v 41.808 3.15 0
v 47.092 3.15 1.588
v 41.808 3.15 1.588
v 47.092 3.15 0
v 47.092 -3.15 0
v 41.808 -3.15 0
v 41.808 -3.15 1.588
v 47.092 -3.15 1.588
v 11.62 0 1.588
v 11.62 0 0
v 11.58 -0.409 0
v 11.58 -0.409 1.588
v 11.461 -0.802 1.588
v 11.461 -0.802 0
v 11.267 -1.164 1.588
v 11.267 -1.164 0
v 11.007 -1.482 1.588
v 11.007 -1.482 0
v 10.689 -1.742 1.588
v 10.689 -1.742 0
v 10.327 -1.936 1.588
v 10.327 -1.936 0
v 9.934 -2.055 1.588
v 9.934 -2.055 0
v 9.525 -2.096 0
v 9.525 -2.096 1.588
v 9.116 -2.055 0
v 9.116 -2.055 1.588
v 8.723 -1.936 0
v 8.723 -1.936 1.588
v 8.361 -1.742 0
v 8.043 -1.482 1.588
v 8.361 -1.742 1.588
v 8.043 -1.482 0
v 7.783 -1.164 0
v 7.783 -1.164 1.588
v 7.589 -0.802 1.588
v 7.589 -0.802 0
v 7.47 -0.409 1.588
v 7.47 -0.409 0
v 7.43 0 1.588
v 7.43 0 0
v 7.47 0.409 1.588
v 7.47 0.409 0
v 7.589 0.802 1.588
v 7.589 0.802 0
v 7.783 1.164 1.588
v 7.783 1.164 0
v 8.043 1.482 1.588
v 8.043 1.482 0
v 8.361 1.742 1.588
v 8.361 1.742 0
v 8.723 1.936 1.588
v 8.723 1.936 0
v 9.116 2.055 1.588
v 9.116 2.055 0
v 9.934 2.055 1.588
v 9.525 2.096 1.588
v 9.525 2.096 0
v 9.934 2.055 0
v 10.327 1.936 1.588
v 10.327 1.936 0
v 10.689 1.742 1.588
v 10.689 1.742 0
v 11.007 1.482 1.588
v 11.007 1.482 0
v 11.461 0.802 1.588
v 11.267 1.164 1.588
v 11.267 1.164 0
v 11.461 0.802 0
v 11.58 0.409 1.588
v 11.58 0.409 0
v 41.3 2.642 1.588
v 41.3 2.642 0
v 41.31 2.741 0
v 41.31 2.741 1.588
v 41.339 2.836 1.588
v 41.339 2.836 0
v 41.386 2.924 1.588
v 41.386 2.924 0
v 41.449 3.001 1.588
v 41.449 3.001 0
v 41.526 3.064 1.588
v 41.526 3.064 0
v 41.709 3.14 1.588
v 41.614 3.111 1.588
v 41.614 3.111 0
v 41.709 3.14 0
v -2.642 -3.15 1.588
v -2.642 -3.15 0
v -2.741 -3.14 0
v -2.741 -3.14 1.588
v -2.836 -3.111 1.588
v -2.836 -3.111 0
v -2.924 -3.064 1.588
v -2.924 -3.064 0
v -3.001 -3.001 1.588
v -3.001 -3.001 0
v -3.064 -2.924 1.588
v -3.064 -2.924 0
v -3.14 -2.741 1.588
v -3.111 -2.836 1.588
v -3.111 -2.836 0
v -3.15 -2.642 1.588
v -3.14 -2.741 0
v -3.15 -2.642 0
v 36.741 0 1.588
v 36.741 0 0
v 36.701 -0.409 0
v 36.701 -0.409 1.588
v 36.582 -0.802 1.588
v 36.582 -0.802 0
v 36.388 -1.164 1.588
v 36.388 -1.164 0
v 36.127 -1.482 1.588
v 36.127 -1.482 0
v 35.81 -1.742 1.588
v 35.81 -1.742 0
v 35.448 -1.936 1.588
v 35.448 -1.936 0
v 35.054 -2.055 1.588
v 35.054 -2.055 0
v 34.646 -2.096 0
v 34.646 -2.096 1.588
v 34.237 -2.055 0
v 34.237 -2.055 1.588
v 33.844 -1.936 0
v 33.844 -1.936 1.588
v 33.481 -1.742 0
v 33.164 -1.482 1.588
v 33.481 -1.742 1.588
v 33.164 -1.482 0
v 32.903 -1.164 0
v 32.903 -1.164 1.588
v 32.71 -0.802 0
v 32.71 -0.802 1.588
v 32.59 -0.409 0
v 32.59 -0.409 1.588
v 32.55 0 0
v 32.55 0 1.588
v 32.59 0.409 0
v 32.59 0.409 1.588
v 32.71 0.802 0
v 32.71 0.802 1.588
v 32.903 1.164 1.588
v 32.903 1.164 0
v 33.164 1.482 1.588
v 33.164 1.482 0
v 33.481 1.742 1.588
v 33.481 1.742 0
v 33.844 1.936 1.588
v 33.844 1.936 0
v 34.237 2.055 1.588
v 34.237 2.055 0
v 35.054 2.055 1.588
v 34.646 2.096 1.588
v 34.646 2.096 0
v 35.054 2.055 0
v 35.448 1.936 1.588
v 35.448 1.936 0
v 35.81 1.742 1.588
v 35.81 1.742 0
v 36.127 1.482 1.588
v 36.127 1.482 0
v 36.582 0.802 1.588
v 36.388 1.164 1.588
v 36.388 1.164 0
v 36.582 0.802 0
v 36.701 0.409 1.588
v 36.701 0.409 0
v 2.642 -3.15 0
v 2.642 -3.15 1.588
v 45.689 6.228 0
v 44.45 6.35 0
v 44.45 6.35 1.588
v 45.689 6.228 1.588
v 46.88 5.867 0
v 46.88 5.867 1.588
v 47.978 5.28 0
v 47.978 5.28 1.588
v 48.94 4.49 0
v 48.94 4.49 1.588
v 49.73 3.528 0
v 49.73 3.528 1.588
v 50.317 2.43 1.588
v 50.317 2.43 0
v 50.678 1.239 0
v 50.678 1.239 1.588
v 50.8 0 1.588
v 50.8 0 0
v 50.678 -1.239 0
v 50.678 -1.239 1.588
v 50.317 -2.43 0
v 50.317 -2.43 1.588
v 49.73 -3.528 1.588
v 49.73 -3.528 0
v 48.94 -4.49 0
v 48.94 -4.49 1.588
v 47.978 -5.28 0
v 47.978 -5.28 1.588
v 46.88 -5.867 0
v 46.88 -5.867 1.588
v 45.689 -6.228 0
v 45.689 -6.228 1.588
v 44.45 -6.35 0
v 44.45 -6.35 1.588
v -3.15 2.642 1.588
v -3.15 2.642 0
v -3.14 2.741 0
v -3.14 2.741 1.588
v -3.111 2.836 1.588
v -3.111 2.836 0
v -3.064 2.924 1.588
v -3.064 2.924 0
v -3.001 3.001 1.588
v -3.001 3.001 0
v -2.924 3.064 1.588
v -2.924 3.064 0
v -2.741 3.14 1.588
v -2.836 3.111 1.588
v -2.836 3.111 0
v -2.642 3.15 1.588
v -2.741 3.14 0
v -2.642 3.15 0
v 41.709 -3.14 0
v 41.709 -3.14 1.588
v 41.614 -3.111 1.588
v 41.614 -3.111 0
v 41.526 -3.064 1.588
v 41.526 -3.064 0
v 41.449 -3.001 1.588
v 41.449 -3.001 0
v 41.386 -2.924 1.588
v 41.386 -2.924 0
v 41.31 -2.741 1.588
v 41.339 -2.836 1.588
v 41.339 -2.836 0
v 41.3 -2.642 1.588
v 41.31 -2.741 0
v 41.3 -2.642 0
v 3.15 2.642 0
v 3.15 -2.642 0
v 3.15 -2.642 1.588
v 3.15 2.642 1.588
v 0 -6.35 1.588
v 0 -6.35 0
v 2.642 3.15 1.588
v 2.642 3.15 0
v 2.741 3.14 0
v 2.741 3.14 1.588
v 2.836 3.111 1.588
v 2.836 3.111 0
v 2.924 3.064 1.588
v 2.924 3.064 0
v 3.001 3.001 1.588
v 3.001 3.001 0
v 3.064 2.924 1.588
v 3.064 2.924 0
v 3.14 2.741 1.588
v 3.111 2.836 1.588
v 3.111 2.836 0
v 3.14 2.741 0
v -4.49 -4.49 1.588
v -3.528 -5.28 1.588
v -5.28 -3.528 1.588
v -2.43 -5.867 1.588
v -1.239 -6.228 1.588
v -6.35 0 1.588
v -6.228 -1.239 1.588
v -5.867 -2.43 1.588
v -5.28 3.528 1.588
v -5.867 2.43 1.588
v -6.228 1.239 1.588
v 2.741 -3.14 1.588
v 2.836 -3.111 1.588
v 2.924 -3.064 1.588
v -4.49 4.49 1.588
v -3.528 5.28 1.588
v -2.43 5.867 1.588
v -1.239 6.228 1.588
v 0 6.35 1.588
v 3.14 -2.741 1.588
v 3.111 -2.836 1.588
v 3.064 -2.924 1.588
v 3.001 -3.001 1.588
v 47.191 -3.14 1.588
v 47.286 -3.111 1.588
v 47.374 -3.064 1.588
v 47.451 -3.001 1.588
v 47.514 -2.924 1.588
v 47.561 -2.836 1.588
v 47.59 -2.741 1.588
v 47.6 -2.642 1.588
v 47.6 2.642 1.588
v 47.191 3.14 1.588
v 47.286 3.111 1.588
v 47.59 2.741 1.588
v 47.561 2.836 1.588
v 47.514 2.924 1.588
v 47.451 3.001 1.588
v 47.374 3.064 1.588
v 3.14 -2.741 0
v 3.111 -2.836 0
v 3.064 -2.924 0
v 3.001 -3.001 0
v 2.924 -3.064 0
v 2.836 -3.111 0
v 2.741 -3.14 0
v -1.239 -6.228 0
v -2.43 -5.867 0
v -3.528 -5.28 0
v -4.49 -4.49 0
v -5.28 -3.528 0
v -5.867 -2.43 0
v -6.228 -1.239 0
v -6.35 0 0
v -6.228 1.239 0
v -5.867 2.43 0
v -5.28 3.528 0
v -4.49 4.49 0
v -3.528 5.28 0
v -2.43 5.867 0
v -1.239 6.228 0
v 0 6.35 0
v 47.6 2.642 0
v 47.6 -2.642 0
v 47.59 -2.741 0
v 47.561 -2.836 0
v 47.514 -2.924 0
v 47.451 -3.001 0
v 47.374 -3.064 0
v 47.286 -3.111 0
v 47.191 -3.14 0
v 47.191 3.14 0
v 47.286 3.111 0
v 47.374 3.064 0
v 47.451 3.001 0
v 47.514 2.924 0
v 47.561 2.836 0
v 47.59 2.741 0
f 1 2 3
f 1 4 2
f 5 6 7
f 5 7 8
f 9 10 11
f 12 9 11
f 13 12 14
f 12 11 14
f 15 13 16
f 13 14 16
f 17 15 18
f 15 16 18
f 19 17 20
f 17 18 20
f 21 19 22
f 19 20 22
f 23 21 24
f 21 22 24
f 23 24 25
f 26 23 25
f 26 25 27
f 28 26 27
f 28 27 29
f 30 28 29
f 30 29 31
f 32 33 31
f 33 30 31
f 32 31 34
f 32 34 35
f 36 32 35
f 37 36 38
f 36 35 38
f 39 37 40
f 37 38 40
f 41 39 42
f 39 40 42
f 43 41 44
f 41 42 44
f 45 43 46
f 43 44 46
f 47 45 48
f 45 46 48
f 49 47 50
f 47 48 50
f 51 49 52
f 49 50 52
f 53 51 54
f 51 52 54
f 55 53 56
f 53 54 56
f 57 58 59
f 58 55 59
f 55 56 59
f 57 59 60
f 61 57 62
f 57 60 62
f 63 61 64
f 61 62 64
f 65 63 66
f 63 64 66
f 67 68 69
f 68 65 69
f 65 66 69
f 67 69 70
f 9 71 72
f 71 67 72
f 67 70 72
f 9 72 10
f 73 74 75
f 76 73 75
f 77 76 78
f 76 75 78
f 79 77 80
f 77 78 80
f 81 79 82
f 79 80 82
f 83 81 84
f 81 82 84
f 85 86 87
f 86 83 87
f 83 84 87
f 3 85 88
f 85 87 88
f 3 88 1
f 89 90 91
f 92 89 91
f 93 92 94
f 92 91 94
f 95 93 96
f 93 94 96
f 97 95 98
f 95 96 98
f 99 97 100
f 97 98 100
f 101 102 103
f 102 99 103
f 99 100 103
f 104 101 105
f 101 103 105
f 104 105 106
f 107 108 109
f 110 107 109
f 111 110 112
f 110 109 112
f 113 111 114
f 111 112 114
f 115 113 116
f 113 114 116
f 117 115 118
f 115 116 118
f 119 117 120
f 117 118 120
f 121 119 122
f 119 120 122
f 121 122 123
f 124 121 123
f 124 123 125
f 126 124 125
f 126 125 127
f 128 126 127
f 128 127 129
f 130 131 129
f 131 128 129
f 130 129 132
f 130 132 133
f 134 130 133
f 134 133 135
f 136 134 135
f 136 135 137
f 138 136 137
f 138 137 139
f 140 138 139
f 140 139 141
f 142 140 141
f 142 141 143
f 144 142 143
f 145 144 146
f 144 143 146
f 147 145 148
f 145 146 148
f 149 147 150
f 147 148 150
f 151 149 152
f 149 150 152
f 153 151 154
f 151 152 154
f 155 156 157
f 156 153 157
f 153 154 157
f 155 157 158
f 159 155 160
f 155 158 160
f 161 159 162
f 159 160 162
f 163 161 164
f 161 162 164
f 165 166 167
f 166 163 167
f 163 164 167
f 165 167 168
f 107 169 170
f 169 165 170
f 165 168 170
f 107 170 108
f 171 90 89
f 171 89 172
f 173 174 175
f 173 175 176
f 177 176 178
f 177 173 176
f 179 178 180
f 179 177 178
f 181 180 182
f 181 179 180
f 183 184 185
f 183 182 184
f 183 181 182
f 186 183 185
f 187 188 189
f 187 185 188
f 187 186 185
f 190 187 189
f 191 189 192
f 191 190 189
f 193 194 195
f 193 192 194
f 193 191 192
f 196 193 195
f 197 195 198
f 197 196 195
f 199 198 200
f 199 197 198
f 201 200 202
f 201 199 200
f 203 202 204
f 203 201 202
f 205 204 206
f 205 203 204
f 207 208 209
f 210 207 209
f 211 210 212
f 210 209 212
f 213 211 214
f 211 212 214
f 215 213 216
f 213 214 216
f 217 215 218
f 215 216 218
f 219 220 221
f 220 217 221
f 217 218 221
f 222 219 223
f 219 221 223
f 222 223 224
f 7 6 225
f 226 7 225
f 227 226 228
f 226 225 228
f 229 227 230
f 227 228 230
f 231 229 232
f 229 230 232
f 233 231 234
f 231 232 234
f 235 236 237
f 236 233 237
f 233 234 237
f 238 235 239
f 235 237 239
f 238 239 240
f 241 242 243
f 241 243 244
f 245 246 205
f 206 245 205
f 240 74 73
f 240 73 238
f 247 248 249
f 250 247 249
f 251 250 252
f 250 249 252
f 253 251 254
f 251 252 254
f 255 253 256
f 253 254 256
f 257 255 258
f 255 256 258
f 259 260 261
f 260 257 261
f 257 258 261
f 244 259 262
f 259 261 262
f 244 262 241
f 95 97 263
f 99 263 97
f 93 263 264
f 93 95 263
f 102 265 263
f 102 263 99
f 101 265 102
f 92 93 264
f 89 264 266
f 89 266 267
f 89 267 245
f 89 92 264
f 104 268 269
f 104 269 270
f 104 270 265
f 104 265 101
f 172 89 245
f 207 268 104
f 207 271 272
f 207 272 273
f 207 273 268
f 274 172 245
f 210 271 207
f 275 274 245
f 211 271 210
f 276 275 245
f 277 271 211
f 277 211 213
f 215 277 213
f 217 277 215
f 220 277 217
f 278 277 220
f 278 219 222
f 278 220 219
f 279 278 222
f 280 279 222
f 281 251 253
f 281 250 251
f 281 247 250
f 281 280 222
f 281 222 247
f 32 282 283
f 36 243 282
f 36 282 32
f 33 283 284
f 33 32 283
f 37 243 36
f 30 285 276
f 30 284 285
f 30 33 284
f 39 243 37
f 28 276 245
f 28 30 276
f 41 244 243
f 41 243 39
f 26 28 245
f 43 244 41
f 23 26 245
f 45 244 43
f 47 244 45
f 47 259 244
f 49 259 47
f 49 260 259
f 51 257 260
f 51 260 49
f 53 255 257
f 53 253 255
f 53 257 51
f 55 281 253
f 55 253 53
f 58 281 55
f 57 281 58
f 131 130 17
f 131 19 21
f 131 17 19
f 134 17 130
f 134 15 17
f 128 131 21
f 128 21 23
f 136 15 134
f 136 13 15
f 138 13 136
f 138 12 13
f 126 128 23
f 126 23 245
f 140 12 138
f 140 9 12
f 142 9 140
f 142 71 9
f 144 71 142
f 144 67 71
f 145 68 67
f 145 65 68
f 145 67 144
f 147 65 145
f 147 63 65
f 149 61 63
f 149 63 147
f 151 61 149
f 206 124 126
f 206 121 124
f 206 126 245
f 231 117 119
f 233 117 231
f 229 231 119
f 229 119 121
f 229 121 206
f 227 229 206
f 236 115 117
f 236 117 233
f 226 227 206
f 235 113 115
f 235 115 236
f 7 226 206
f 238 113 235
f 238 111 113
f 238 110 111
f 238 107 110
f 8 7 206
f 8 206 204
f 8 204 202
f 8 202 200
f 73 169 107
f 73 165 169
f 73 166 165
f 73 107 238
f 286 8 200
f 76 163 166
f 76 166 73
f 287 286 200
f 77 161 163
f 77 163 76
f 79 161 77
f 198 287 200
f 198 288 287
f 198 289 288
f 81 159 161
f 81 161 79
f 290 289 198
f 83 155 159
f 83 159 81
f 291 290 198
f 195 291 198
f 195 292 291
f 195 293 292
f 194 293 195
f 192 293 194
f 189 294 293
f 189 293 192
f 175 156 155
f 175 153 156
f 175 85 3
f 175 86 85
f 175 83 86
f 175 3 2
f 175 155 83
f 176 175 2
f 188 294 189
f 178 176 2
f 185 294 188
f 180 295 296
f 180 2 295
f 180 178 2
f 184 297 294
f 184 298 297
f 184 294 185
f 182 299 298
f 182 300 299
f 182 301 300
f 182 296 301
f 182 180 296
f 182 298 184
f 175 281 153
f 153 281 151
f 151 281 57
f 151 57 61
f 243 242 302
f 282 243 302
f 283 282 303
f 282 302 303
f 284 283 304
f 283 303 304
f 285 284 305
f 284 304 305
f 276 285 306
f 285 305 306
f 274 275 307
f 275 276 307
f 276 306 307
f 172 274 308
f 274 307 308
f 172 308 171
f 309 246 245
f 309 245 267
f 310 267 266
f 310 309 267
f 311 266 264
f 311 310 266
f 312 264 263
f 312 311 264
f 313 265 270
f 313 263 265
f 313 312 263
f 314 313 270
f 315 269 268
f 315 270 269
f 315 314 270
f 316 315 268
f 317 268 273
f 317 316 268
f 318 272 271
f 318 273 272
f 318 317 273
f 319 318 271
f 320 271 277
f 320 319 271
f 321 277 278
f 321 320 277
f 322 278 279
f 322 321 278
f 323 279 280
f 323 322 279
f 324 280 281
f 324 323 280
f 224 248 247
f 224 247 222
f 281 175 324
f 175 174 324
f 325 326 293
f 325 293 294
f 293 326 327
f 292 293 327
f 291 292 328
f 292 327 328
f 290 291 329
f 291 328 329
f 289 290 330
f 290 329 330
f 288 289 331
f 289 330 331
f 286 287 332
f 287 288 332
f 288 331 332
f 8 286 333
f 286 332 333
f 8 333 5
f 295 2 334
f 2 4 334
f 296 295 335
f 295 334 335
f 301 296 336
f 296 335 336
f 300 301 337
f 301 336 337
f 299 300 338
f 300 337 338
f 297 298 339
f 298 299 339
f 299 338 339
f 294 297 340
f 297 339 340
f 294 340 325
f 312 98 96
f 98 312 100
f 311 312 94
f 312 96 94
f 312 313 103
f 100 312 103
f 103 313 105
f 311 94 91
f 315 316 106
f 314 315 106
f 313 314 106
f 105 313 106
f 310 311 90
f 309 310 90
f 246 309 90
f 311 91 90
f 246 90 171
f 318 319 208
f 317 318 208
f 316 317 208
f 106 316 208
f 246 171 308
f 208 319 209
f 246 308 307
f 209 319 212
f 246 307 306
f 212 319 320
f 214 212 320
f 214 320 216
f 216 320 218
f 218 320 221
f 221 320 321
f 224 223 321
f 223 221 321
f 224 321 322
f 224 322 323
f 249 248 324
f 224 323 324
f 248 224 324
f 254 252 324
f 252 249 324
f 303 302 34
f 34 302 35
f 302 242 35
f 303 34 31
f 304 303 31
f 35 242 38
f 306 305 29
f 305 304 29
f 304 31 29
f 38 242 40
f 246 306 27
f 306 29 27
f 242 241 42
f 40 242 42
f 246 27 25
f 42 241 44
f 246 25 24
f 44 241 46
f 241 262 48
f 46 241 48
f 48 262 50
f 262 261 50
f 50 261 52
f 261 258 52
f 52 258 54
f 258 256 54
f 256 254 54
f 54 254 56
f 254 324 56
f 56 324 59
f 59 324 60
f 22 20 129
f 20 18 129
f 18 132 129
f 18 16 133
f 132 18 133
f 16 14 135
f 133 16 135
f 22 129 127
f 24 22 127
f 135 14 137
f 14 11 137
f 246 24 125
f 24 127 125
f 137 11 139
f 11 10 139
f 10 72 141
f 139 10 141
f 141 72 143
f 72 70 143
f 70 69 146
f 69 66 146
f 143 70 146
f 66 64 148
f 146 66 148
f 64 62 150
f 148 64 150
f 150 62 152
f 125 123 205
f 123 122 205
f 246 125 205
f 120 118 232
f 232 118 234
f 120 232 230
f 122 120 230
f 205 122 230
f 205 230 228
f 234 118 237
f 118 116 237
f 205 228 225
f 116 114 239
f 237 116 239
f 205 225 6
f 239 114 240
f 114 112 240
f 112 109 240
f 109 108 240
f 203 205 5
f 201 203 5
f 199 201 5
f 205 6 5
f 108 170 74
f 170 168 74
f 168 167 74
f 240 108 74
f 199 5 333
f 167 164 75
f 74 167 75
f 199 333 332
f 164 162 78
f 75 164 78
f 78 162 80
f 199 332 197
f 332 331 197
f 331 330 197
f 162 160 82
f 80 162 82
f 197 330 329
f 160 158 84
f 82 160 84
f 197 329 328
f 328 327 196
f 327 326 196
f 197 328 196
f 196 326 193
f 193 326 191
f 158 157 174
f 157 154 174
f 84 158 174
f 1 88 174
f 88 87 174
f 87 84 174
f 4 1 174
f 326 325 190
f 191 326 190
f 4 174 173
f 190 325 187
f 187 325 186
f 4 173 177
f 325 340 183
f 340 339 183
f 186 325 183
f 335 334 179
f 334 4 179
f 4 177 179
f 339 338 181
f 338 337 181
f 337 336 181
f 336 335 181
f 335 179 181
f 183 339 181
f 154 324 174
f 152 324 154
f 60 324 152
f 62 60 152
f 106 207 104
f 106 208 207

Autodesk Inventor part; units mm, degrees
ref_plane "YZ Plane" through (0, 0, 0) normal (1, 0, 0) x (0, 1, 0)
ref_plane "XZ Plane" through (0, 0, 0) normal (0, 1, 0) x (-1, 0, 0)
ref_plane "XY Plane" through (0, 0, 0) normal (0, 0, 1) x (1, 0, 0)
sketch "Sketch1" plane through (0, 0, 0) normal (0, 0, 1) x (1, 0, 0)
  arc A0 (0, 6.35) -> (0, -6.35) centre (0, 0) ccw
  arc A1 (44.45, -6.35) -> (44.45, 6.35) centre (44.45, 0) ccw
  line L0 (0, -6.35) -> (44.45, -6.35)
  line L1 (44.45, 6.35) -> (0, 6.35)
  line L2 (-2.6416, -3.1496) -> (2.6416, -3.1496)
  line L3 (3.1496, -2.6416) -> (3.1496, 2.6416)
  line L4 (2.6416, 3.1496) -> (-2.6416, 3.1496)
  line L5 (-3.1496, 2.6416) -> (-3.1496, -2.6416)
  line L6 (-3.1496, -3.1496) -> (3.1496, 3.1496) construction
  line L7 (3.1496, -3.1496) -> (-3.1496, 3.1496) construction
  line L8 (41.8084, -3.1496) -> (47.0916, -3.1496)
  line L9 (47.5996, -2.6416) -> (47.5996, 2.6416)
  line L10 (47.0916, 3.1496) -> (41.8084, 3.1496)
  line L11 (41.3004, 2.6416) -> (41.3004, -2.6416)
  line L12 (41.3004, -3.1496) -> (47.5996, 3.1496) construction
  line L13 (47.5996, -3.1496) -> (41.3004, 3.1496) construction
  arc A2 (-2.6416, 3.1496) -> (-3.1496, 2.6416) centre (-2.6416, 2.6416) ccw
  arc A3 (3.1496, 2.6416) -> (2.6416, 3.1496) centre (2.6416, 2.6416) ccw
  arc A4 (2.6416, -3.1496) -> (3.1496, -2.6416) centre (2.6416, -2.6416) ccw
  arc A5 (-3.1496, -2.6416) -> (-2.6416, -3.1496) centre (-2.6416, -2.6416) ccw
  arc A6 (47.0916, -3.1496) -> (47.5996, -2.6416) centre (47.0916, -2.6416) ccw
  arc A7 (41.3004, -2.6416) -> (41.8084, -3.1496) centre (41.8084, -2.6416) ccw
  arc A8 (41.8084, 3.1496) -> (41.3004, 2.6416) centre (41.8084, 2.6416) ccw
  arc A9 (47.5996, 2.6416) -> (47.0916, 3.1496) centre (47.0916, 2.6416) ccw
  circle A10 centre (9.525, 0) radius 2.0955
  circle A11 centre (34.6456, 0) radius 2.0955
  dimension "d2" = 12.7
  dimension "d3" = 12.7
  dimension "d5" = 6.2992
  dimension "d6" = 6.2992
  dimension "d7" = 6.2992
  dimension "d8" = 6.2992
  dimension "d9" = 0.508
  dimension "d12" = 4.191
  dimension "d13" = 4.191
extrude "Extrusion1" add sketch "Sketch1" along normal blind 1.5875
properties part number "Gearbox Mirrored" material "Acetal Resin, White"
